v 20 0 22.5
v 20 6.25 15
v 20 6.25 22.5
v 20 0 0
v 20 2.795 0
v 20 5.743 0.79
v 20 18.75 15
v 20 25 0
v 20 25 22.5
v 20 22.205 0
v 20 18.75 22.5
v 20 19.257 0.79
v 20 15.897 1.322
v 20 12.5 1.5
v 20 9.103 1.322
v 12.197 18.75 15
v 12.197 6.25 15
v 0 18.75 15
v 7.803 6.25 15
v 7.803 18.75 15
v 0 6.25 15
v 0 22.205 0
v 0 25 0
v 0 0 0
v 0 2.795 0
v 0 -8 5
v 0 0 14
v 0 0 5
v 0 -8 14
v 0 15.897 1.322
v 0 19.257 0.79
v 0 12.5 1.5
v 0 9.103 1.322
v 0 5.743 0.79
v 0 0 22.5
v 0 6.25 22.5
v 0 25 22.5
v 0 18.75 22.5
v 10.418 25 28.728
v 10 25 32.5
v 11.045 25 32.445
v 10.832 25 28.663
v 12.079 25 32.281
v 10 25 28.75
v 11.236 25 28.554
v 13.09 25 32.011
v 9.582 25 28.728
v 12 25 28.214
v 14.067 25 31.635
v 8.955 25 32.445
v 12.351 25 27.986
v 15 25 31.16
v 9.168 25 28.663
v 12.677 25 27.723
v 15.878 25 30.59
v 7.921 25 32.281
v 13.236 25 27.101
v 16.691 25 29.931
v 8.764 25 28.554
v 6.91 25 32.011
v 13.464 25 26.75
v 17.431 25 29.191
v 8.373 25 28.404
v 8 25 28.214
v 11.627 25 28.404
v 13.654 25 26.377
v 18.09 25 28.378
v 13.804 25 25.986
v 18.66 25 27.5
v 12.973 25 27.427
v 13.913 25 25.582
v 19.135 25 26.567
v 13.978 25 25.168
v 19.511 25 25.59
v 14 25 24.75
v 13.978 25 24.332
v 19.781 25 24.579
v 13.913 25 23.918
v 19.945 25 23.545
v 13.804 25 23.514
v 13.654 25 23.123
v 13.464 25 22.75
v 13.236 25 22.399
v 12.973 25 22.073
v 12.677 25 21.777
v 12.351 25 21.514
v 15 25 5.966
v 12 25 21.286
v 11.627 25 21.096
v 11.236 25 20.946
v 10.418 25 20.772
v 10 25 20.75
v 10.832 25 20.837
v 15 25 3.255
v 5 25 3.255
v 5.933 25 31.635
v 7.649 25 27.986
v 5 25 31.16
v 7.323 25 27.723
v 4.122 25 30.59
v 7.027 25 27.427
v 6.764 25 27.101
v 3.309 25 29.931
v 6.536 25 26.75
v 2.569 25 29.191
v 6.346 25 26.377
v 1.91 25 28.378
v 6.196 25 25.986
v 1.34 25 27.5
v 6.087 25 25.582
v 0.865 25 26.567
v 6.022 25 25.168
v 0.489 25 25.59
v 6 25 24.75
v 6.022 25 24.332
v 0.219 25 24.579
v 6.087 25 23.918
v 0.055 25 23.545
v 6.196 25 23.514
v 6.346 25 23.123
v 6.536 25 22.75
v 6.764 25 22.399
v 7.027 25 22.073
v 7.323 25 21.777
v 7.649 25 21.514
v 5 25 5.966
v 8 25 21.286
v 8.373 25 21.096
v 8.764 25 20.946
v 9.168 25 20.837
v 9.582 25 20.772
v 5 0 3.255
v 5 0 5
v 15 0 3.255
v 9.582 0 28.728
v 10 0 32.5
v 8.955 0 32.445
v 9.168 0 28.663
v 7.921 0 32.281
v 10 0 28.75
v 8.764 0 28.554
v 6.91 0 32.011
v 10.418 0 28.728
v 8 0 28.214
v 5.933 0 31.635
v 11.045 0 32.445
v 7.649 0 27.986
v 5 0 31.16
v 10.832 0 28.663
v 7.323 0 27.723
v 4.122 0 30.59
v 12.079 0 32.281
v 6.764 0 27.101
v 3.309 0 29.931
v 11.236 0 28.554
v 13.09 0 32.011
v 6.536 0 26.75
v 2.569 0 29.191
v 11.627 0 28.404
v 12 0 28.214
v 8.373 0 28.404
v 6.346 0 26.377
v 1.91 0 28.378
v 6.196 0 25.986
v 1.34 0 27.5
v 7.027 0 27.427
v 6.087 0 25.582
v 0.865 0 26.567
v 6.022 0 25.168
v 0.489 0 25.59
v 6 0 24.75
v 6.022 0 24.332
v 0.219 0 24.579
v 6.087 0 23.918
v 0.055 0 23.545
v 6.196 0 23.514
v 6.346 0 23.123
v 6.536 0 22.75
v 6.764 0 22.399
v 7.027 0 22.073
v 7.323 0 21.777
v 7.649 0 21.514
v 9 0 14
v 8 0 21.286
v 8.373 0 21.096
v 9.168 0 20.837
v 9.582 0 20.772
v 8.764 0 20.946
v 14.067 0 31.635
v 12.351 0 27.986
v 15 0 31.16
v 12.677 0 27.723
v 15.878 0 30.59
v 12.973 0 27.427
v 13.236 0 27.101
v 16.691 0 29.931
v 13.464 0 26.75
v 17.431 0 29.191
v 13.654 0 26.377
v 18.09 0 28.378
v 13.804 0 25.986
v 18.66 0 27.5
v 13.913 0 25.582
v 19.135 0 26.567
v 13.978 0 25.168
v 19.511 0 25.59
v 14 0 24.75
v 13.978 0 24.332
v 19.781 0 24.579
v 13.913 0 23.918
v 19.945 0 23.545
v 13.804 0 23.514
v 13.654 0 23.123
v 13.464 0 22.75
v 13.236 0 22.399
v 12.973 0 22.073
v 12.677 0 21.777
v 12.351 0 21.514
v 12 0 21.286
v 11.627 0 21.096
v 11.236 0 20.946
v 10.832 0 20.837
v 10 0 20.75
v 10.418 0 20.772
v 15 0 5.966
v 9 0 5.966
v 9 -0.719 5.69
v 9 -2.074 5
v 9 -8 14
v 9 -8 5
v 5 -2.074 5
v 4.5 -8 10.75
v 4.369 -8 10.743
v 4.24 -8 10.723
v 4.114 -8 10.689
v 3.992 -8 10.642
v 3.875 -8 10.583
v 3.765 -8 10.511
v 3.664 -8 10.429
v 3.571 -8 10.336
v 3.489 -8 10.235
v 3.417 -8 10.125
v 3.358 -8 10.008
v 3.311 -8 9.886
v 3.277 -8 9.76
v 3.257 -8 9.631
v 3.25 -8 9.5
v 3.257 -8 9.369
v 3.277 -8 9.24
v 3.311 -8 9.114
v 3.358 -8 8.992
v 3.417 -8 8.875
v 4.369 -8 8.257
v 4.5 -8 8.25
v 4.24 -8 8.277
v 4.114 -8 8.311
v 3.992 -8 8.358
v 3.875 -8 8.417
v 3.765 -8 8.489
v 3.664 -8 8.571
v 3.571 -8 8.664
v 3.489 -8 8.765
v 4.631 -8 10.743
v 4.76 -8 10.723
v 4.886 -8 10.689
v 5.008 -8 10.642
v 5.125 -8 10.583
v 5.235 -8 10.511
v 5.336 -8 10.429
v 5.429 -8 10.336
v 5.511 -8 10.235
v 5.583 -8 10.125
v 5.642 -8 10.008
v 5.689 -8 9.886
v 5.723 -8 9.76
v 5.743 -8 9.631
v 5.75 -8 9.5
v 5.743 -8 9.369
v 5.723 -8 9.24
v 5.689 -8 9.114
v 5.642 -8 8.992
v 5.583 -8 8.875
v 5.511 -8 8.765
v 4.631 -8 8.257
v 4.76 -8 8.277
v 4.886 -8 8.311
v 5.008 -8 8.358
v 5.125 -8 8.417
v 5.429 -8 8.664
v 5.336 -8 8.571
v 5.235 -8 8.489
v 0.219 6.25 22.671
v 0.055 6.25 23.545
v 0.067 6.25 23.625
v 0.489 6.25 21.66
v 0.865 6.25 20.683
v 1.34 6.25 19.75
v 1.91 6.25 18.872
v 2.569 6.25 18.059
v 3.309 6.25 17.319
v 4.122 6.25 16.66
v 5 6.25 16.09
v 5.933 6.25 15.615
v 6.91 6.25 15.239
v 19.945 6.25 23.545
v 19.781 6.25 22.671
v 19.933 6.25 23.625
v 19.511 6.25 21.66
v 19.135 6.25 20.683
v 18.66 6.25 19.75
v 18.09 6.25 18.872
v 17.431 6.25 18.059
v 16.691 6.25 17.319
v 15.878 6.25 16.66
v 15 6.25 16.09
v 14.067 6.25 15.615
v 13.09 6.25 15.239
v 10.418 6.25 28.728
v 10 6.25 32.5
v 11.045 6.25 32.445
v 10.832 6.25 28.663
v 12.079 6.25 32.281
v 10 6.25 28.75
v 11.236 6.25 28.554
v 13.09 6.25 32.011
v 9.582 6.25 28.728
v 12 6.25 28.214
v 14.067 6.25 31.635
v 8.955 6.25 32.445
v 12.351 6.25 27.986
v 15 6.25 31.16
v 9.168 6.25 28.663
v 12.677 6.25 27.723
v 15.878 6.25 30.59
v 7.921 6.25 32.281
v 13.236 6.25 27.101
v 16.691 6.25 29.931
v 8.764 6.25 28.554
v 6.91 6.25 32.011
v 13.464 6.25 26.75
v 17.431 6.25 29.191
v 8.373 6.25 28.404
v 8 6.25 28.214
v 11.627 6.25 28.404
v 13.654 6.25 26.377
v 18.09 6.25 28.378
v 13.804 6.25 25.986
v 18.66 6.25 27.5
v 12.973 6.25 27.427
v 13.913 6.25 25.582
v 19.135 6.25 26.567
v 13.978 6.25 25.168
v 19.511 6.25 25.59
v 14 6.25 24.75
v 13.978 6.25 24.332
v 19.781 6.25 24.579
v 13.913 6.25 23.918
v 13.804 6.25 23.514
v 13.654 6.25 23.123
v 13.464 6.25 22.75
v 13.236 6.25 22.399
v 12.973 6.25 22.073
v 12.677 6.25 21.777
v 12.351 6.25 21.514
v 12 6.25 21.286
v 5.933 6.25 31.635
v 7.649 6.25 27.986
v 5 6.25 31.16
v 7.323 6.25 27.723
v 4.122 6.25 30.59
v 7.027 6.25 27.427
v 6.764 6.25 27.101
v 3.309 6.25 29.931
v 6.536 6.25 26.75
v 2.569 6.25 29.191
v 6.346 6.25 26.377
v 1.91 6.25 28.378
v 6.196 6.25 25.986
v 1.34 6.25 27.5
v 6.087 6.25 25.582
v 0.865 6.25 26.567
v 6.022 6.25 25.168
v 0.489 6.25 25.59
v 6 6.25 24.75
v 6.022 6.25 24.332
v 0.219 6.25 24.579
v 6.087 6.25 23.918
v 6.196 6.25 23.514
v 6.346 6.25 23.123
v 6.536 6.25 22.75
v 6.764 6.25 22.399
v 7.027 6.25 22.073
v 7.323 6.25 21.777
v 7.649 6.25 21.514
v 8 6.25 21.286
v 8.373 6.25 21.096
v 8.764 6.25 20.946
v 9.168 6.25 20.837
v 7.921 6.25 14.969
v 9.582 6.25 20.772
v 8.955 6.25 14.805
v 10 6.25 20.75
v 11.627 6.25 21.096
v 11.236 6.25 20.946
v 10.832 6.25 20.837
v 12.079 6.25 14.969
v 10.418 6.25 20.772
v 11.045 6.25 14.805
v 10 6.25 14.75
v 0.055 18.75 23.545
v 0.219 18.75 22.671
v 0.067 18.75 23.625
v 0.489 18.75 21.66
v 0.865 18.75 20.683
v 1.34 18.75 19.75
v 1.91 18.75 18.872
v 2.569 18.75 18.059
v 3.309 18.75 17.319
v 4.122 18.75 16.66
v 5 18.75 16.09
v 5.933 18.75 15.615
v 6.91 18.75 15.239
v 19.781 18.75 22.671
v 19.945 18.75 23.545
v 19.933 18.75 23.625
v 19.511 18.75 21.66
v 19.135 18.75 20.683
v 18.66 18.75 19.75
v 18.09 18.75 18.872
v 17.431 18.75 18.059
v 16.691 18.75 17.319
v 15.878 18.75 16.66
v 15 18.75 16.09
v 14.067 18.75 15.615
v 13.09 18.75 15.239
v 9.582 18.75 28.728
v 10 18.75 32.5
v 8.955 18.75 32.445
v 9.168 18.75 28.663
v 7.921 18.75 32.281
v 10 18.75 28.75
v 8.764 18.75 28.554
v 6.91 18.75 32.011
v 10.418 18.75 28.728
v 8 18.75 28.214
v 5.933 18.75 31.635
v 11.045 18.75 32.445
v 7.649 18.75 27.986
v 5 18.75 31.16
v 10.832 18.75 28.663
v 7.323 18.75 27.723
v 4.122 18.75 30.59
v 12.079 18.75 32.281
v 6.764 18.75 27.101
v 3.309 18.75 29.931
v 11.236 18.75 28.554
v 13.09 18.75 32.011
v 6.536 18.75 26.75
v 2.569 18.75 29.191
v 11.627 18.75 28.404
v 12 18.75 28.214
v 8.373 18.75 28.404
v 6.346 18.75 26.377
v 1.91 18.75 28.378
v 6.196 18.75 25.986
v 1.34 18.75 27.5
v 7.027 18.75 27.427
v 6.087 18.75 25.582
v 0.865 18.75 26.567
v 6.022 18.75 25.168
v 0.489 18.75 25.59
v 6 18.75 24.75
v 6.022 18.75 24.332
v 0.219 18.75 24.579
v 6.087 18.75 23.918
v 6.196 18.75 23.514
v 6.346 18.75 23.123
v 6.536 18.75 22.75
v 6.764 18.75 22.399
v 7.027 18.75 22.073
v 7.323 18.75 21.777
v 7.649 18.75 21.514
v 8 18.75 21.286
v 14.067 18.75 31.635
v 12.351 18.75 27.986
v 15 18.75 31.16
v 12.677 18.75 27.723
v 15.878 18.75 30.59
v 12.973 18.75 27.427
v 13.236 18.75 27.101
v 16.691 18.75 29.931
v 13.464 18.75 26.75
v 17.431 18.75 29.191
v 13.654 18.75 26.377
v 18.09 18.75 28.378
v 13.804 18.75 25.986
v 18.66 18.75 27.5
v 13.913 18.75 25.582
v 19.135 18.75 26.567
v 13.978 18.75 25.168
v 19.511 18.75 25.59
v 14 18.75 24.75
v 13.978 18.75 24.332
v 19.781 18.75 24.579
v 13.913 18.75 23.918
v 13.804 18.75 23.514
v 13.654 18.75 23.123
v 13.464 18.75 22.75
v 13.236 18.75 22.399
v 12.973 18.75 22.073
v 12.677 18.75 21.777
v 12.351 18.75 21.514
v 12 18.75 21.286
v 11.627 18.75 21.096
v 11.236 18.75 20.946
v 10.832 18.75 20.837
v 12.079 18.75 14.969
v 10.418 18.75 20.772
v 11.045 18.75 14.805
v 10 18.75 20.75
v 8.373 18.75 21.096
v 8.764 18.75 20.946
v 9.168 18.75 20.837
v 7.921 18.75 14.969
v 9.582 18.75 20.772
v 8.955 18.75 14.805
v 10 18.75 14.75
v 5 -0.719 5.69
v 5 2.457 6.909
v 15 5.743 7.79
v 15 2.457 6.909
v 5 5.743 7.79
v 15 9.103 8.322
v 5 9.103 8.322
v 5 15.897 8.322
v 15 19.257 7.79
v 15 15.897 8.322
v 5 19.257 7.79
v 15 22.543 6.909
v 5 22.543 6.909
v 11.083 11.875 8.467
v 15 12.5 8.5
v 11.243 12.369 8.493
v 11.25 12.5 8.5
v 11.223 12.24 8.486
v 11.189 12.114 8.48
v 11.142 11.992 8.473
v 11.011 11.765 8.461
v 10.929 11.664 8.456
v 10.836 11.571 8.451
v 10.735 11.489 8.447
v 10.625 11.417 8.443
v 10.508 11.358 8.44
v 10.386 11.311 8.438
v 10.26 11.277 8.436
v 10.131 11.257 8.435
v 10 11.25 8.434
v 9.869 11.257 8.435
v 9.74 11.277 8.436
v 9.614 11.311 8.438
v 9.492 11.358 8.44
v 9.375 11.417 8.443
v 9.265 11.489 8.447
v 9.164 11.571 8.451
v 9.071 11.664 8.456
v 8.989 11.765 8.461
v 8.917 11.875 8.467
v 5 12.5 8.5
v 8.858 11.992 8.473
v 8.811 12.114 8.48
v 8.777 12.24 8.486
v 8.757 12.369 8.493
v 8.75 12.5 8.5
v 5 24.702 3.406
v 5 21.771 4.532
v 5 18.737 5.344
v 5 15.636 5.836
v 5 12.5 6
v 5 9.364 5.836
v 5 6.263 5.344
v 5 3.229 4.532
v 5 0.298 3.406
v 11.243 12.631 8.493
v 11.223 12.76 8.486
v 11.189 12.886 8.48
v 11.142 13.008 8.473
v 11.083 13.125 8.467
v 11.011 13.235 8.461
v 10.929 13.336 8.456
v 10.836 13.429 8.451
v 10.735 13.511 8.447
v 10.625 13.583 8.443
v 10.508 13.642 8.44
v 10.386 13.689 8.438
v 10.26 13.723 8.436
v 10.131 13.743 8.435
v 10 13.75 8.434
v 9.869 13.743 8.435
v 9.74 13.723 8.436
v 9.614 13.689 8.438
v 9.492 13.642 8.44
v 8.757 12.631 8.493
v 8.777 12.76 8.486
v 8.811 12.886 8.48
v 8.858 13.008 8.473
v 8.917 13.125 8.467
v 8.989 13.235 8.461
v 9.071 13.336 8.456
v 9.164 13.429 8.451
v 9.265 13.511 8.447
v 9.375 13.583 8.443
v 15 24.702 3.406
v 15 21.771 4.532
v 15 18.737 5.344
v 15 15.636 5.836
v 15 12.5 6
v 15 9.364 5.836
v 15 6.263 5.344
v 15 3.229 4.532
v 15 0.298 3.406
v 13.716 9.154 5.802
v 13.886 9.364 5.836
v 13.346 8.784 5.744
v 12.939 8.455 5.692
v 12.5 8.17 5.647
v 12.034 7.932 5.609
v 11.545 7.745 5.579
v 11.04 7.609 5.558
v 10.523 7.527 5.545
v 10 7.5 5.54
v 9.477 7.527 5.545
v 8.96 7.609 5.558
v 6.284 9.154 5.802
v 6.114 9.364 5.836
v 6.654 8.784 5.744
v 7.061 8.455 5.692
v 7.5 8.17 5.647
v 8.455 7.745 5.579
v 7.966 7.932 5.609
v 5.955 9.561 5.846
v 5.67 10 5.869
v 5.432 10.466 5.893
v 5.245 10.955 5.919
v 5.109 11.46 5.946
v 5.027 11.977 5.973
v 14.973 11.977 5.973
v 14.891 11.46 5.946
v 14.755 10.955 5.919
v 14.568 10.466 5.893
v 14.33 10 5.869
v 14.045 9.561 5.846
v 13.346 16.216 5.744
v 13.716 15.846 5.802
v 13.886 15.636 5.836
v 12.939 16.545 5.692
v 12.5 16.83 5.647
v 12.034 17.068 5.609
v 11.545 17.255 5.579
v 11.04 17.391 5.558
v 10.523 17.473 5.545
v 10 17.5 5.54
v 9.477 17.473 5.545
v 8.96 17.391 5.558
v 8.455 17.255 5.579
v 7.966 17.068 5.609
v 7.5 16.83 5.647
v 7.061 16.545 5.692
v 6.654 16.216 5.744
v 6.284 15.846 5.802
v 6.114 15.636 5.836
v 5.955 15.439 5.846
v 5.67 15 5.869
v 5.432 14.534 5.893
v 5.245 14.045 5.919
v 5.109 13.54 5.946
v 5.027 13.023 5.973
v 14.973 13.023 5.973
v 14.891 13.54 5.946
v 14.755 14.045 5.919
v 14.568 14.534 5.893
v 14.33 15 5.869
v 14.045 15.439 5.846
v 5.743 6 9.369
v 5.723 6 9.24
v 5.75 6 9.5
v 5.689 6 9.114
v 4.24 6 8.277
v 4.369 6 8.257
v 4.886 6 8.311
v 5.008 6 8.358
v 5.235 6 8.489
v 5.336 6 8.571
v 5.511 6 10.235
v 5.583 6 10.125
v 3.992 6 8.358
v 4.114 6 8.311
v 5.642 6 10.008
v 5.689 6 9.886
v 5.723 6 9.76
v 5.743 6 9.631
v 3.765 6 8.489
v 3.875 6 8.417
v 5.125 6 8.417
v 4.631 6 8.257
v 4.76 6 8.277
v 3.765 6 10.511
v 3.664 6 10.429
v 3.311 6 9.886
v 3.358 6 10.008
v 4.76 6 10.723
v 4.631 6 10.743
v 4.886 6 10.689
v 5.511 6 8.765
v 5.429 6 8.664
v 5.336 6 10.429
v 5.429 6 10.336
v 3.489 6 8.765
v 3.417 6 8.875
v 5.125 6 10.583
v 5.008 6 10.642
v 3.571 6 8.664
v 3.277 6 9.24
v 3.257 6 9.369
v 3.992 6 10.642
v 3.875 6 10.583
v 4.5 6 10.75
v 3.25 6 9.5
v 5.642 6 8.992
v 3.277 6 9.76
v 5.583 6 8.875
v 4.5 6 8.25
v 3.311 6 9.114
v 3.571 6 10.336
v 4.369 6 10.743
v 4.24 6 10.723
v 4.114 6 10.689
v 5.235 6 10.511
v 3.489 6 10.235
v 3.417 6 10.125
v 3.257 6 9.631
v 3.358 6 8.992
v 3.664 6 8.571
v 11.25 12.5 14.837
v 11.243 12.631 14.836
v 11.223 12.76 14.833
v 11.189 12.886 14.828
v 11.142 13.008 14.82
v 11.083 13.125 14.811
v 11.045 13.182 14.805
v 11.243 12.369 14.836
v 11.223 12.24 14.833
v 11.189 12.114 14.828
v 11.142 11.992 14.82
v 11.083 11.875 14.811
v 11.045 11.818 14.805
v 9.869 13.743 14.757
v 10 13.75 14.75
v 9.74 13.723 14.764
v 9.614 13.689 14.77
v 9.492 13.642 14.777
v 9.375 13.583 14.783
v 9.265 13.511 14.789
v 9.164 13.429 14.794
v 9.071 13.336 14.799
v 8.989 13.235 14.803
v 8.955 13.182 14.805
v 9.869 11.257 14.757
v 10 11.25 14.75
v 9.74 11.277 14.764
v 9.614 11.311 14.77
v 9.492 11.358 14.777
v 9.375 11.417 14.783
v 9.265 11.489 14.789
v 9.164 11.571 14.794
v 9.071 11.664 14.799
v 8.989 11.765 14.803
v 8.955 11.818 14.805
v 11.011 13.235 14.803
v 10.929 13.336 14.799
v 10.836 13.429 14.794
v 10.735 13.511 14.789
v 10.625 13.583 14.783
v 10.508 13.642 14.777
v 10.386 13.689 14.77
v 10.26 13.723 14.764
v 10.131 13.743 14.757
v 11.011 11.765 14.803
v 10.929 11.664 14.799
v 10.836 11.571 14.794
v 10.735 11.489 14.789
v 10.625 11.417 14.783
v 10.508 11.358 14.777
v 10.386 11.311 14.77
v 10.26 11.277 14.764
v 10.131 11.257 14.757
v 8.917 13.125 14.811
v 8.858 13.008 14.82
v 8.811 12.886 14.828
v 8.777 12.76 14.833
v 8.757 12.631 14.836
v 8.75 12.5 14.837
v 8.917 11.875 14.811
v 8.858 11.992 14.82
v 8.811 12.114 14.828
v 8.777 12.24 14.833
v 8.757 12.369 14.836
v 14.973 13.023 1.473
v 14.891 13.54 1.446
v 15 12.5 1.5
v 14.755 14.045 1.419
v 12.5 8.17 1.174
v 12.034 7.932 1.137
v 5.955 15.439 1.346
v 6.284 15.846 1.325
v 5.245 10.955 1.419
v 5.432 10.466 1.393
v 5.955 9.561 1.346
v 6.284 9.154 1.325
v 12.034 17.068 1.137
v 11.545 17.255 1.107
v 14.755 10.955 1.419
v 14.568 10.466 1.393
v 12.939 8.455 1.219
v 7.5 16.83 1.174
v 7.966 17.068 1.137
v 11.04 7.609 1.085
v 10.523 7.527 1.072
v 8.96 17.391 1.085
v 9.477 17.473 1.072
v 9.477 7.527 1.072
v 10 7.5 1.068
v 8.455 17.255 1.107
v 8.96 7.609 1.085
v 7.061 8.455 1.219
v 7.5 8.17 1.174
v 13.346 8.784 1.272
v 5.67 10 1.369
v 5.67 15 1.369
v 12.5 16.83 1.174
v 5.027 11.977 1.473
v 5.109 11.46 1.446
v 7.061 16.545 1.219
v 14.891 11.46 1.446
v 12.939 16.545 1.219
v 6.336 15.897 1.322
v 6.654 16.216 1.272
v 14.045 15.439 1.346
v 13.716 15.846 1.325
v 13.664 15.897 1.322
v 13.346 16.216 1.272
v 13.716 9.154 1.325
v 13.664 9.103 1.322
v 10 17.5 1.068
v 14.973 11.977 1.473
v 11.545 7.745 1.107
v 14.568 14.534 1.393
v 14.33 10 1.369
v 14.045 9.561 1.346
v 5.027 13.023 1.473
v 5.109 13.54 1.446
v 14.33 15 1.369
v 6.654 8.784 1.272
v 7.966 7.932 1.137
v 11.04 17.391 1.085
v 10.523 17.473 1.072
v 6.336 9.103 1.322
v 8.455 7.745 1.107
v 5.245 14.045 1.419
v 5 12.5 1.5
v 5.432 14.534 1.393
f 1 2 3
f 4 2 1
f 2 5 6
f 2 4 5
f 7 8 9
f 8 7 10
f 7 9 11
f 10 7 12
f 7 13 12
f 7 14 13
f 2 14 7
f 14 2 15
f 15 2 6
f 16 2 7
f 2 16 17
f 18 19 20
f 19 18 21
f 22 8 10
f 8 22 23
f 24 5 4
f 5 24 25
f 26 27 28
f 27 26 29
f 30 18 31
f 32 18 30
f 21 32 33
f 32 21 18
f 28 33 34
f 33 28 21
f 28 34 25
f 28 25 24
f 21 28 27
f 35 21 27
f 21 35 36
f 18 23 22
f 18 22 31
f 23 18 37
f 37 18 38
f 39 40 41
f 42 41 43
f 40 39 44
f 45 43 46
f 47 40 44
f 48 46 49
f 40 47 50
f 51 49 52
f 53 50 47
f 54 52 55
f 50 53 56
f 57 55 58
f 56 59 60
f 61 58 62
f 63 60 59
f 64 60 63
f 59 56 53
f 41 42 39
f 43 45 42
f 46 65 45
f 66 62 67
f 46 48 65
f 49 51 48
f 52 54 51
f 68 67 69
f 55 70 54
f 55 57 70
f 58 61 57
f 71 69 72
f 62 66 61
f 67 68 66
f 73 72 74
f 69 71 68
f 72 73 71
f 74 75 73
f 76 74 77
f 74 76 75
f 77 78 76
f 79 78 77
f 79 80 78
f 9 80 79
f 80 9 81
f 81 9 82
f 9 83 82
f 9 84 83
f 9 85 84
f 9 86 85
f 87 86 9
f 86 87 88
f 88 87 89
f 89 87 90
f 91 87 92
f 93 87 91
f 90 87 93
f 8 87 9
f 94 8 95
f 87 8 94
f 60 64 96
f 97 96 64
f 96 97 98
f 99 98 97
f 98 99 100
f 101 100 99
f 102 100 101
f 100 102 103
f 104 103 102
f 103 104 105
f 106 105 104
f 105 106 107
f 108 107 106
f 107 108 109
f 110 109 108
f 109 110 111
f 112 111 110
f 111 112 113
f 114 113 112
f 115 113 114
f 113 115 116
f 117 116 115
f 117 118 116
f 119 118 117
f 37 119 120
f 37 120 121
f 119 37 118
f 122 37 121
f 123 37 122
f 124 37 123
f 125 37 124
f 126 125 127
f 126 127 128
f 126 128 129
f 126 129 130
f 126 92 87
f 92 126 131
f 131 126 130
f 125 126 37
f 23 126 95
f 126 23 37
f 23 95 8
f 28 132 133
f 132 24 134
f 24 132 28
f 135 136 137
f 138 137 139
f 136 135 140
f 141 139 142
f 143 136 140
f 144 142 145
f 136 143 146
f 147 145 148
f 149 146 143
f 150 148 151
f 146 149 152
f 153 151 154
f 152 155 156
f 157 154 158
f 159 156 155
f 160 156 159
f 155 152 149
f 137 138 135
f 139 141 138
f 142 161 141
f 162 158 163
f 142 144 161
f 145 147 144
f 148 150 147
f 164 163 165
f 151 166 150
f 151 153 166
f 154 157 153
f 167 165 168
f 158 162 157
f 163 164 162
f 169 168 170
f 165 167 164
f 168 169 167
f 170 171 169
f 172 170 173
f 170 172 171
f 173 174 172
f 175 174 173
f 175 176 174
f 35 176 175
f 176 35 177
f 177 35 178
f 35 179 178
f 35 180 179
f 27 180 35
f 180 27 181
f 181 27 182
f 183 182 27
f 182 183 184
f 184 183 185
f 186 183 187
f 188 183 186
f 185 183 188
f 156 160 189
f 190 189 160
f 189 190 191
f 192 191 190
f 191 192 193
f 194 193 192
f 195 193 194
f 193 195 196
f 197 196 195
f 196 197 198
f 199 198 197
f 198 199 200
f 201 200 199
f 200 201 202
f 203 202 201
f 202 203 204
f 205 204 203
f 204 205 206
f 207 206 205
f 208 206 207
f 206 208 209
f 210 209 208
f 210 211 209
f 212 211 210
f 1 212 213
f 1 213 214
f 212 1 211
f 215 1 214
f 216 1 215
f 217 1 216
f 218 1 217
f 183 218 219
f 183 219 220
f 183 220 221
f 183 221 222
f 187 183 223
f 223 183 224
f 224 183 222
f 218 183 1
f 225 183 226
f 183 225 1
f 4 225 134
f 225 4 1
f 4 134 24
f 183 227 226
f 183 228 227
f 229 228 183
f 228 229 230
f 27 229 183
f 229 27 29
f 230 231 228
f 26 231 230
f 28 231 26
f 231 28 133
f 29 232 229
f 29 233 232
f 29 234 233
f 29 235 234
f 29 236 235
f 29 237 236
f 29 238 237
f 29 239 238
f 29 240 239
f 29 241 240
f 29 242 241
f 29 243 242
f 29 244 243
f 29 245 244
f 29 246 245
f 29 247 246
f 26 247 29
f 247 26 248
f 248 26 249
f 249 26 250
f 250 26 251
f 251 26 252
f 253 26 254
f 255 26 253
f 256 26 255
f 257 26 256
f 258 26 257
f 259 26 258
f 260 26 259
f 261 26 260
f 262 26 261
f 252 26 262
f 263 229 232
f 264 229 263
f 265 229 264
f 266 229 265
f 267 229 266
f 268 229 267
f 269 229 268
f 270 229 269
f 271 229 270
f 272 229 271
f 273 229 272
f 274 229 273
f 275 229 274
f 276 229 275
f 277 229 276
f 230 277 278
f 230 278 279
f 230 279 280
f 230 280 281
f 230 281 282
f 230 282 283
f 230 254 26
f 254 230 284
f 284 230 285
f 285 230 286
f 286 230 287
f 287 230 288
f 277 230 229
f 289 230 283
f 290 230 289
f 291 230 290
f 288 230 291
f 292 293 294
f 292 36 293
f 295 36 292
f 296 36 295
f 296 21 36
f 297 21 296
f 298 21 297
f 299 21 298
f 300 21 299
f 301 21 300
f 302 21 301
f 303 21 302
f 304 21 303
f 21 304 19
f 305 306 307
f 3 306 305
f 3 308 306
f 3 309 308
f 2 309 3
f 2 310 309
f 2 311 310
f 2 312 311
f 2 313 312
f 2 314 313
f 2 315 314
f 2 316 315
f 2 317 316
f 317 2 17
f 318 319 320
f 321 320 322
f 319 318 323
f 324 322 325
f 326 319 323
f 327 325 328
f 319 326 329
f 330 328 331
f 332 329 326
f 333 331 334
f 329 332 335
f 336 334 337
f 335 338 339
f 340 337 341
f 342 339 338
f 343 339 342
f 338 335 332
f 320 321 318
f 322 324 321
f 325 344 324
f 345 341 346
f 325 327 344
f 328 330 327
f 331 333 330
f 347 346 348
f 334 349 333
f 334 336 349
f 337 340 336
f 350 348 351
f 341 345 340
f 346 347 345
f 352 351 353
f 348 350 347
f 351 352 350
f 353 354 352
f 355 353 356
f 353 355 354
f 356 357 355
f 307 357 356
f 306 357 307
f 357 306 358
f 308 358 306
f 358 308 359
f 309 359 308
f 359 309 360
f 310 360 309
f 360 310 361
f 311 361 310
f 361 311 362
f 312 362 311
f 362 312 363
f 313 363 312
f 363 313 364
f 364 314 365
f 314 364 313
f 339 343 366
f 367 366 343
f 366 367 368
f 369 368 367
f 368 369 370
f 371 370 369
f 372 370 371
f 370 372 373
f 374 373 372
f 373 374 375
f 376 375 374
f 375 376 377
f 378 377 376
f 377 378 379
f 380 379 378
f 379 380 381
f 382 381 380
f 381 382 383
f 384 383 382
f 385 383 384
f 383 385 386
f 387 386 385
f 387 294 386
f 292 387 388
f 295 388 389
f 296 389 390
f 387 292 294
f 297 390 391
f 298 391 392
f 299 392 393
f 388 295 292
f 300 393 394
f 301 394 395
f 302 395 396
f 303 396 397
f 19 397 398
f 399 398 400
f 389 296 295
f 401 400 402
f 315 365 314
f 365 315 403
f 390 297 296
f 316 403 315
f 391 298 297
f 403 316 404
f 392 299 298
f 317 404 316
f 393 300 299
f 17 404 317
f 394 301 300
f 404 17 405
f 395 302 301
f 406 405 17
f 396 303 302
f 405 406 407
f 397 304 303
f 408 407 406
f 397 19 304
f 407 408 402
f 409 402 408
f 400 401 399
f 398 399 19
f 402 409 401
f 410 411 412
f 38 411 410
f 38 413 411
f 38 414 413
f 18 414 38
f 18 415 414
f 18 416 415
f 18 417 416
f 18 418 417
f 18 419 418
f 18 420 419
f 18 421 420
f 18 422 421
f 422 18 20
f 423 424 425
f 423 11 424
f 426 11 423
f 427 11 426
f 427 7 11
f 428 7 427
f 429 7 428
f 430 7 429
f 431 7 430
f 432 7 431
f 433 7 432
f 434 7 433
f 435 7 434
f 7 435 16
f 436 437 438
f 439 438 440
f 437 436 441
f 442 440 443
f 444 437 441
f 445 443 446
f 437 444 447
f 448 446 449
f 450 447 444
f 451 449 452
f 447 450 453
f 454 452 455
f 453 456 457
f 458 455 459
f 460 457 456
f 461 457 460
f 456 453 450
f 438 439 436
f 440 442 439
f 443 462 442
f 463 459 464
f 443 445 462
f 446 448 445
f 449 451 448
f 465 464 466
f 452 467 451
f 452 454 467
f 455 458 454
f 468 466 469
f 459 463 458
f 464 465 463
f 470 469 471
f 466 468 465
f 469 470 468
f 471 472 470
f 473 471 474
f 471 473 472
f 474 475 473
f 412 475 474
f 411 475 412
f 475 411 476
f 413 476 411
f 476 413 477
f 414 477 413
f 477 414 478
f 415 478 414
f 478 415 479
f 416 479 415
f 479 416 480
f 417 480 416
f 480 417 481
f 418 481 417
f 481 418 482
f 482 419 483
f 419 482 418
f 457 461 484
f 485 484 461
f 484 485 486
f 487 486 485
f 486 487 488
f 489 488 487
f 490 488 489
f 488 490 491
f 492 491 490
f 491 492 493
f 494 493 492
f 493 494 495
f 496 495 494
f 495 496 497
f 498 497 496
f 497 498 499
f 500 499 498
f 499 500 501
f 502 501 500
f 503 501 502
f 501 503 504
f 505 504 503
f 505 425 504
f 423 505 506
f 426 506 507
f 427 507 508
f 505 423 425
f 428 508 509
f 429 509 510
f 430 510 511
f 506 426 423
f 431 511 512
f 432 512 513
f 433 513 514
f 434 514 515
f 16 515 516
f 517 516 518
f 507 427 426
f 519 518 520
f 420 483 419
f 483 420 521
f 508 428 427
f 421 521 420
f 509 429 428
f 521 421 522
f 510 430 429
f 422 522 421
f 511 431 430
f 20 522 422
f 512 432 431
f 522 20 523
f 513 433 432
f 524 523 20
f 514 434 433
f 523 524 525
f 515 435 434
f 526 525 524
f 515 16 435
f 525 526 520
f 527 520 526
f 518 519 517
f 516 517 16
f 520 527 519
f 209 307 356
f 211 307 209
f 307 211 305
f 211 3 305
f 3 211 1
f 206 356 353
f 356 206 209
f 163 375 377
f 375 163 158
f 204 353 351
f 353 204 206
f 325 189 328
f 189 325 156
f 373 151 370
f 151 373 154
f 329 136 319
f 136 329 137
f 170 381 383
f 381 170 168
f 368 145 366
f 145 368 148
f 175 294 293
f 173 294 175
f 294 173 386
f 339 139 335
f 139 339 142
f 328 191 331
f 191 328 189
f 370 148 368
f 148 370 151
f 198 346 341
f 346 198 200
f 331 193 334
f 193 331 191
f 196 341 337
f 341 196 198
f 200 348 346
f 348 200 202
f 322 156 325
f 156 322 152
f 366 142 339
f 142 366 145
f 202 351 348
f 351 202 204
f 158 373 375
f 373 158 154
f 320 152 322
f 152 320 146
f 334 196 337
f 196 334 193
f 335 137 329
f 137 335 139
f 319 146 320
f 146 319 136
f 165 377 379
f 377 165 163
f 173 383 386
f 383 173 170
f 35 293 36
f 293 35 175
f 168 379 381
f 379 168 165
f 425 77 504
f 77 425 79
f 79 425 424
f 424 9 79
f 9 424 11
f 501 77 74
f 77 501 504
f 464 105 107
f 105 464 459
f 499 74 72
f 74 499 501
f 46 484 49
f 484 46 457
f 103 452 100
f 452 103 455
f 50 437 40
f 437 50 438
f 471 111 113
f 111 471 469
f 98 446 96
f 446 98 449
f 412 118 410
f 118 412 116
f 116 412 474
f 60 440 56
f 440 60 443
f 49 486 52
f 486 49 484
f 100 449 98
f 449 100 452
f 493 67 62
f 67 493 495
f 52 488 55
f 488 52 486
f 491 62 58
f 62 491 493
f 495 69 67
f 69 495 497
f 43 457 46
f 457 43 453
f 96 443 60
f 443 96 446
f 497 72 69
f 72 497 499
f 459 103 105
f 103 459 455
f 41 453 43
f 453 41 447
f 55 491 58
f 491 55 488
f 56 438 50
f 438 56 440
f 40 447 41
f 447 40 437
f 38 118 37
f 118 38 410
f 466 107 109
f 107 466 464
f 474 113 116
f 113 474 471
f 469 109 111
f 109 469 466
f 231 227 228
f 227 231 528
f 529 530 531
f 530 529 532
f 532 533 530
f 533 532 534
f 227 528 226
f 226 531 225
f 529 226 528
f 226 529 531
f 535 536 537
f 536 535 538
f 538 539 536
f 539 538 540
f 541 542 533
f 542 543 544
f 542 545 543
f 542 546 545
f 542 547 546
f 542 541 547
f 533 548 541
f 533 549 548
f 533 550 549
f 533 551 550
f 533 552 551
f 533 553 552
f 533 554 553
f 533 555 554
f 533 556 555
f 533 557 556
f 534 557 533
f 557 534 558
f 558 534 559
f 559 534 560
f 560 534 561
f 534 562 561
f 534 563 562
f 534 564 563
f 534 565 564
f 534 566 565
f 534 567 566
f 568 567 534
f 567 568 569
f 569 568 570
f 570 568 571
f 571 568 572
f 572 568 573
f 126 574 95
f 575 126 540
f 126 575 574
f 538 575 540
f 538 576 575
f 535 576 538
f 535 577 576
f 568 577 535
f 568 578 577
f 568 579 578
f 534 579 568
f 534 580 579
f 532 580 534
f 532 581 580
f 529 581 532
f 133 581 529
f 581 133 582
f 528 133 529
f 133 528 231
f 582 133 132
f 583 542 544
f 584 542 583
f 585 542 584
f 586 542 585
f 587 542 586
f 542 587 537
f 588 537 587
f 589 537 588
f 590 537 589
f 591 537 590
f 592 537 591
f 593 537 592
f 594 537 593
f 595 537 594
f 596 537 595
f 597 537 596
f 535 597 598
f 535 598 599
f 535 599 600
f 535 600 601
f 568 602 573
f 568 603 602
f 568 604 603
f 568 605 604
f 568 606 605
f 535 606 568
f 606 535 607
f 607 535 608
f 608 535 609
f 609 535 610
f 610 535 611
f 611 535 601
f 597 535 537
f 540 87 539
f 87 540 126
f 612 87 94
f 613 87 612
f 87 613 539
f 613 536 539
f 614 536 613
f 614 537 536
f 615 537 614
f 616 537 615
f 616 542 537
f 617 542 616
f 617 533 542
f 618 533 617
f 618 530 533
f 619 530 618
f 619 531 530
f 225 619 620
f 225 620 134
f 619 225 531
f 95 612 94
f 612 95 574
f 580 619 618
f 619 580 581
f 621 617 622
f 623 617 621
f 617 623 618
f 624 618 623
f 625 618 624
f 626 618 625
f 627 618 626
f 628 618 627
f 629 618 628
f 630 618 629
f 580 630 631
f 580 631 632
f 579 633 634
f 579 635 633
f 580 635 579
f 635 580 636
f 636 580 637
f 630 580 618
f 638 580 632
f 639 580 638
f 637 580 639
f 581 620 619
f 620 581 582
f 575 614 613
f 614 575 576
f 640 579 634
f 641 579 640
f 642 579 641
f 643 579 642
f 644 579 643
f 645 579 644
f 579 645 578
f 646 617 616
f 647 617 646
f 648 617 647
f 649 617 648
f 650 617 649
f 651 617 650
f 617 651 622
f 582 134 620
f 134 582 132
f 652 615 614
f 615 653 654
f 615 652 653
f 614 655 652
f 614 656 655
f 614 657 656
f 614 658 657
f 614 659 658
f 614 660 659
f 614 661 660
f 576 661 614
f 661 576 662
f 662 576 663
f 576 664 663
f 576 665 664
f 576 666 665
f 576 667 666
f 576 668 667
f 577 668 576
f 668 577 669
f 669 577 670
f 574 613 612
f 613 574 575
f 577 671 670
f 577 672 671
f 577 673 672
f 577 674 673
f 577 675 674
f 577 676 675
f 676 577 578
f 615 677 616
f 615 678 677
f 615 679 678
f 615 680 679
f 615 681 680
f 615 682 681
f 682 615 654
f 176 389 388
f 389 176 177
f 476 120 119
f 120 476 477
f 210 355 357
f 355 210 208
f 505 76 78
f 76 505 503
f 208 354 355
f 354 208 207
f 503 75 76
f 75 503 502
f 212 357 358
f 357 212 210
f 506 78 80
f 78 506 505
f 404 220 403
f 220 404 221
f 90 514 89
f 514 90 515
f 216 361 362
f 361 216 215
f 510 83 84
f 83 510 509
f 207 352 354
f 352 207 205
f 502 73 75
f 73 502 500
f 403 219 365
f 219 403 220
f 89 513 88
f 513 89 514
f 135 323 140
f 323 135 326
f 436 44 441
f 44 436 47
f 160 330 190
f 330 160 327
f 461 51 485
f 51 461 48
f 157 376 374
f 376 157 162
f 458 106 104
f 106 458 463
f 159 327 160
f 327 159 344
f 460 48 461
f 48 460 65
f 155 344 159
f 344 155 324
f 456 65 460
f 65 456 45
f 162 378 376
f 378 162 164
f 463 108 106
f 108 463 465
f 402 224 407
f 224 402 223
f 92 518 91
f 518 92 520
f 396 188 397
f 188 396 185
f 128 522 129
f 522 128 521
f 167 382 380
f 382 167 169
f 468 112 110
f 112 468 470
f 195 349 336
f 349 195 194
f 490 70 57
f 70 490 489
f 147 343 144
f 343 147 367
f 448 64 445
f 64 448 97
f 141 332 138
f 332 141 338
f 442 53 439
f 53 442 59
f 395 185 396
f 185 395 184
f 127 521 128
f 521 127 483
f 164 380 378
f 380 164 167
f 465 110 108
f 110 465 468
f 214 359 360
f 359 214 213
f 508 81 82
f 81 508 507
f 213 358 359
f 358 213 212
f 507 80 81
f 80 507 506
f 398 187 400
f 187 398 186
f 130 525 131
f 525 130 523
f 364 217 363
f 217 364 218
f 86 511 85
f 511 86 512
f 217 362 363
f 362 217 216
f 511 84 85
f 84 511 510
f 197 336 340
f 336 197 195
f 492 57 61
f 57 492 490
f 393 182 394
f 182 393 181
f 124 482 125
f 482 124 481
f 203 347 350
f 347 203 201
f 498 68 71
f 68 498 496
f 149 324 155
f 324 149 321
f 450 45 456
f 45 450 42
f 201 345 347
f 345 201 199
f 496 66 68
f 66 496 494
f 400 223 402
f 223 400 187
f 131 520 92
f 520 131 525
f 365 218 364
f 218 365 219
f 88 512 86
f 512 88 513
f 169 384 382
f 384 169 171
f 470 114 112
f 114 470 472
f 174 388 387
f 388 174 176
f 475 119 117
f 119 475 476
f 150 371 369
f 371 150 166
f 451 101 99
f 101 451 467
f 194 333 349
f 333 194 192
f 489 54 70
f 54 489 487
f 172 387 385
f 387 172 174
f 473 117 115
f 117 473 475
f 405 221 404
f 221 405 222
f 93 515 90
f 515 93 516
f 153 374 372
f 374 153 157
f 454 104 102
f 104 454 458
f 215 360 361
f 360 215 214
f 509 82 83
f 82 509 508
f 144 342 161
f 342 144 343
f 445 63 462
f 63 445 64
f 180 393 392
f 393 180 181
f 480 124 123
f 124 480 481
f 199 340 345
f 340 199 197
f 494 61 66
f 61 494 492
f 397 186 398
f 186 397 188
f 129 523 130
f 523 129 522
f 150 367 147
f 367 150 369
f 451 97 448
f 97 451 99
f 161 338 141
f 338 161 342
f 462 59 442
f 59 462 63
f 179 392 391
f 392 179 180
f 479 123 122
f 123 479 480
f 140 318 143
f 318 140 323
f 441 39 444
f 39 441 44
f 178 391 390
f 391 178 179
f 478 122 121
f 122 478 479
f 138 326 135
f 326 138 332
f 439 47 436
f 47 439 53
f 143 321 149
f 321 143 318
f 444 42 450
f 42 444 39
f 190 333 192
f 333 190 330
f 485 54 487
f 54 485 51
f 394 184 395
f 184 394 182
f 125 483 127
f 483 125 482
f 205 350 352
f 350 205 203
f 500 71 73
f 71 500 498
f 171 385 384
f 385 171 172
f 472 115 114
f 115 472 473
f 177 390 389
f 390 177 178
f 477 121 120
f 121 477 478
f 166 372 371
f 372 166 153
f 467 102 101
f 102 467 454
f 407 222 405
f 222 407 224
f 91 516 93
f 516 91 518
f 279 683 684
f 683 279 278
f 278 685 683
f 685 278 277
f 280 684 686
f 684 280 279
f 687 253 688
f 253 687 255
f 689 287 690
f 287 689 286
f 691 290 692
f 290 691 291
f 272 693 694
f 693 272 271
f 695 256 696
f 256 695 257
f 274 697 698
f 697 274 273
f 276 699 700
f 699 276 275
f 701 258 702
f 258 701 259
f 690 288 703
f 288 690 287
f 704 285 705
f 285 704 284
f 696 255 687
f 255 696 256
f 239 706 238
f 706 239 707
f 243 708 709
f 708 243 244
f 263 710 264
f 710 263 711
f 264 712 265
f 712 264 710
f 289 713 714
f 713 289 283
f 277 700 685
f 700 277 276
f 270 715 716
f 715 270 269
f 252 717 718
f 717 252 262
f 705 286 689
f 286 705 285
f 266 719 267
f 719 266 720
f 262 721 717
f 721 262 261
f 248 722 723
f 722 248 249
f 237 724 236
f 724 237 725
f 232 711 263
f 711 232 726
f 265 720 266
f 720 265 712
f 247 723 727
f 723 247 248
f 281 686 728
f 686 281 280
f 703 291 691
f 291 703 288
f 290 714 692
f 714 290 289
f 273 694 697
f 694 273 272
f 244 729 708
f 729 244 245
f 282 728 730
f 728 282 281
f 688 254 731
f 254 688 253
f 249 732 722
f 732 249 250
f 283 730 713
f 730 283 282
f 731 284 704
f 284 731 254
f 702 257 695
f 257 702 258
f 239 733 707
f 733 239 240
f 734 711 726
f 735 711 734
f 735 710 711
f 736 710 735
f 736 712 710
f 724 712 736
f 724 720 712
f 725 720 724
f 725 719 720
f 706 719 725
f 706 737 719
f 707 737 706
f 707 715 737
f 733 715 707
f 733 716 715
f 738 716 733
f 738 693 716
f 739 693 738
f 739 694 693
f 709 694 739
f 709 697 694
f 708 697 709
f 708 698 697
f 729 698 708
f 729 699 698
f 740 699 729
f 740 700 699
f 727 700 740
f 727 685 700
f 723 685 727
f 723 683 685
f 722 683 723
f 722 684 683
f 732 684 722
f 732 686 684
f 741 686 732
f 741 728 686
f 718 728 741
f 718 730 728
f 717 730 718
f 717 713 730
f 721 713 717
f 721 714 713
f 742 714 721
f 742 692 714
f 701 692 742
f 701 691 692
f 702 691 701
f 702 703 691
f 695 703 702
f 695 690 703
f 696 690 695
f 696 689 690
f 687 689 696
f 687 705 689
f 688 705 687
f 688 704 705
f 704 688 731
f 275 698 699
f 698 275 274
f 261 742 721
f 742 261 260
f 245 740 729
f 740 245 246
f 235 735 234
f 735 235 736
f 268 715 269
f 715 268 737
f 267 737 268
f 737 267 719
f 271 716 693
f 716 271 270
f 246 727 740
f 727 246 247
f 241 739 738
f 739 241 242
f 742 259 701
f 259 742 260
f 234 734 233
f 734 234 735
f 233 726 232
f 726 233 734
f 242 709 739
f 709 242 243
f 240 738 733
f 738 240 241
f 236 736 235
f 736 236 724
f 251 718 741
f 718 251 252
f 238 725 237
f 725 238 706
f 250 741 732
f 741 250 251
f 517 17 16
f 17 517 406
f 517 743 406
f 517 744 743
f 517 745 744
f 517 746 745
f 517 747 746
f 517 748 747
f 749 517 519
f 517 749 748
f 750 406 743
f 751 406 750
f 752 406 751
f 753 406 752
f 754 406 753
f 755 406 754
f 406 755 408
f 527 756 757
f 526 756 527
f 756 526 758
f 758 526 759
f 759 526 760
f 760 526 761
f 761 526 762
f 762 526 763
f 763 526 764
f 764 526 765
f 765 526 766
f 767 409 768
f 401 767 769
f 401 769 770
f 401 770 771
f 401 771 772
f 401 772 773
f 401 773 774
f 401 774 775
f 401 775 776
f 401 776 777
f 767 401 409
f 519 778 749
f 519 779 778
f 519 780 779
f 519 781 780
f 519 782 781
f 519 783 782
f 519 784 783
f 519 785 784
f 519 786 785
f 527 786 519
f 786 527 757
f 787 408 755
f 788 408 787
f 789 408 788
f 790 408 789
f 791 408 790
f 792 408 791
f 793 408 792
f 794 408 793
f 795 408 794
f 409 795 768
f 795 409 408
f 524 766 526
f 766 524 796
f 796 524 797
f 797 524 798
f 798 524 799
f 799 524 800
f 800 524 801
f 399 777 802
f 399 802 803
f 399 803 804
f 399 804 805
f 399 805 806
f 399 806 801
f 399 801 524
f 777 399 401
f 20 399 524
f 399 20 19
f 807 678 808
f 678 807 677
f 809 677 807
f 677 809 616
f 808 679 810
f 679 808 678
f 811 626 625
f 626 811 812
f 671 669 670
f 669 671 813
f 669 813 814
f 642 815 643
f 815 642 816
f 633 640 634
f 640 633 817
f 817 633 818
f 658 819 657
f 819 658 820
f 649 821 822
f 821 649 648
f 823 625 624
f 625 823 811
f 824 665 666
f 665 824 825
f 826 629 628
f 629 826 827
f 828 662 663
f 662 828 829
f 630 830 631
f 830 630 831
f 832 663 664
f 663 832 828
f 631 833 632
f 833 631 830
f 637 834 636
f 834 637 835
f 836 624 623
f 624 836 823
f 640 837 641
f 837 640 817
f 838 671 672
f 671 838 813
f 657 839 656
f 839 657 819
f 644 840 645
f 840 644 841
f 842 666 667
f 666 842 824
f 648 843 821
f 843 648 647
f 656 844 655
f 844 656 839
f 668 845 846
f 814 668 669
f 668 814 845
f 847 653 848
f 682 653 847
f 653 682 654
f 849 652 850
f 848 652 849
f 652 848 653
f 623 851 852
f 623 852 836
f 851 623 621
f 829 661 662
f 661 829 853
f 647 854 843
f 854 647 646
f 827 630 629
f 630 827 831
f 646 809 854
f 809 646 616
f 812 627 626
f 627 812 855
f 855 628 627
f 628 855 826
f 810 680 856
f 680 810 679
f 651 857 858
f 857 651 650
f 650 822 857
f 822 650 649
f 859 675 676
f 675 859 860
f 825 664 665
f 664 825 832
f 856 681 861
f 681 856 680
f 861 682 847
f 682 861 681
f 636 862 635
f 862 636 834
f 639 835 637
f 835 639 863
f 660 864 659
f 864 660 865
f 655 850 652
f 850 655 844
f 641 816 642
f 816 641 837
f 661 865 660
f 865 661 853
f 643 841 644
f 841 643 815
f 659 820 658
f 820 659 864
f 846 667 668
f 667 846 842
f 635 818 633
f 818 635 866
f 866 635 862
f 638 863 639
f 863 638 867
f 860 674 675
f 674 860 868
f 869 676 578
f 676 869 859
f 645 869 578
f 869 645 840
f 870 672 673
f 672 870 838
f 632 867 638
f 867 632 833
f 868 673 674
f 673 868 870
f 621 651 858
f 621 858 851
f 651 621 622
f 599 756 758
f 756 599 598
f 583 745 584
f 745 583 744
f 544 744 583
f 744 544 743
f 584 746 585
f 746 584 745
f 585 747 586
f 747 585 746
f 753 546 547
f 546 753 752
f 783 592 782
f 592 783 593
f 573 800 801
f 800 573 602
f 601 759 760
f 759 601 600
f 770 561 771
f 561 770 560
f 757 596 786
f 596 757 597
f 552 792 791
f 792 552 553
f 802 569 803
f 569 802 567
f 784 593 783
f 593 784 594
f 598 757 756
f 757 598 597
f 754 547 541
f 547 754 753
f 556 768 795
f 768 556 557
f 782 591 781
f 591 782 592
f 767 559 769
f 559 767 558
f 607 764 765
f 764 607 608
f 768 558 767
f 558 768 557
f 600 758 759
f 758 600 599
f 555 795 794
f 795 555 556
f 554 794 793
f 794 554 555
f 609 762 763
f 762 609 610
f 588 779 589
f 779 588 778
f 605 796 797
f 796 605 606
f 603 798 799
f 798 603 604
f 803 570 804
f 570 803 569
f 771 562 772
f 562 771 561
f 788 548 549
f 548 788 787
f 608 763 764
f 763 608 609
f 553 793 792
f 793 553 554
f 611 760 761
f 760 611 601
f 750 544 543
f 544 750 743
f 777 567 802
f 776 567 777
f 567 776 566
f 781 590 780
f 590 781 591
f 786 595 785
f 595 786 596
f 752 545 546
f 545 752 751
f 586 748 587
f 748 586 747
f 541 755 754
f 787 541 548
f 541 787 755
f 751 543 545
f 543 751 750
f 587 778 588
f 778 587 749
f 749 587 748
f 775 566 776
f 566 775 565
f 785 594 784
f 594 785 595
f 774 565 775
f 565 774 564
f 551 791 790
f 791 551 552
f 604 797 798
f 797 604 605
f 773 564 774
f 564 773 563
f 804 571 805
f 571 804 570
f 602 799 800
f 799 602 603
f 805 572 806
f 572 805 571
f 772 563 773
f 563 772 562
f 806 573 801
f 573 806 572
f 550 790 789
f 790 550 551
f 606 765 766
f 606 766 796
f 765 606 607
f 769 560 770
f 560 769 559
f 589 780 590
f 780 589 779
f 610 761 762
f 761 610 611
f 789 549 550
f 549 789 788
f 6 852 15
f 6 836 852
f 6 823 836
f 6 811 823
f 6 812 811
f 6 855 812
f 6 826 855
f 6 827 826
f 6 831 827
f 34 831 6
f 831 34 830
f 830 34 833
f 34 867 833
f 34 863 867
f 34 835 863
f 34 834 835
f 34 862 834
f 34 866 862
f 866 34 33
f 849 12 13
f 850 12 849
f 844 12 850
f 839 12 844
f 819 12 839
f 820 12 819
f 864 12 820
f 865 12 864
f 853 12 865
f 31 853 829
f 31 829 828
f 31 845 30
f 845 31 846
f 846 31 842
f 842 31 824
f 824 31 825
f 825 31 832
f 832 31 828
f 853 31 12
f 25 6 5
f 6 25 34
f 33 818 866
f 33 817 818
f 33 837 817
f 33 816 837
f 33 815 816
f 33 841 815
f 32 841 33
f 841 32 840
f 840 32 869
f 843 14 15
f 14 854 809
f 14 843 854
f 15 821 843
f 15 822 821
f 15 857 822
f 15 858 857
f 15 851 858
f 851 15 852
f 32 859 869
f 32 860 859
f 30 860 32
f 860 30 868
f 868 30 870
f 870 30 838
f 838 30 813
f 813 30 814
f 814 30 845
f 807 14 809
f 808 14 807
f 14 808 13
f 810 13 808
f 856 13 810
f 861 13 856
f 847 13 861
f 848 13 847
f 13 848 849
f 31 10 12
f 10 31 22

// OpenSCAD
$fn = 60;
difference () {
    union () {
	cube ( size = [20,25,15]); //Basisblock
	translate ([0,-8,5]) cube ( size = [9,8,9]);
        translate ([0,0,15]) cube ( size = [20,25/4,15*0.5]); //Angle Connector 1
        translate ([0,25-25/4,15]) cube ( size = [20,25/4,15*0.5]); // Angle Connector 2
	translate ([20/2,25/4,15*1.5]) rotate ([90,0,0]) cylinder ( h = 25/4, r = 20/2 ); // Angle 1
	translate ([20/2,25,15*1.5]) rotate ([90,0,0]) cylinder ( h = 25/4, r = 20/2 ); // Angle 2
    }
    union () {
        translate ([20/2,-1,15*1.65]) rotate ([-90,0,0]) cylinder ( h = 25+2, r = 8/2); // Screw Shaft 1
        translate ([9/2,-8-1,5+9/2]) rotate ([-90,0,0]) cylinder ( h = 15, r = 2.5/2); // Screw Shaft 1
	translate ([20/2,25/2+25/4,15*1.65]) rotate ([90,0,0]) cylinder ( h = 25/2, r = 20/2 ); // Angle Space
// 	translate ([-1,20/4,2]) cube ( size = [20+2,20/2,1]);
	translate ([20/2,25/2,-1]) cylinder ( h = 9, r = 10/2); // Press-In Space
	translate ([20/2,25/2,2+1-1]) cylinder ( h = 15, r = 2.5/2); // Press-In Screw
	
	translate ([20/4,25/2,-24]) rotate ([270,0,-90]) { // Belt Corridor
            difference () {
                cylinder ( h = 10, r = 65/2 );
                translate ([0,0,-1]) cylinder ( h = 12, r = 60/2 );
            }
        }
        translate ([-1,25/2,-31]) rotate ([270,0,-90]) cylinder ( h = 20+2, r = 65/2 ); // Tool Handle Nosefitting

    }
}
